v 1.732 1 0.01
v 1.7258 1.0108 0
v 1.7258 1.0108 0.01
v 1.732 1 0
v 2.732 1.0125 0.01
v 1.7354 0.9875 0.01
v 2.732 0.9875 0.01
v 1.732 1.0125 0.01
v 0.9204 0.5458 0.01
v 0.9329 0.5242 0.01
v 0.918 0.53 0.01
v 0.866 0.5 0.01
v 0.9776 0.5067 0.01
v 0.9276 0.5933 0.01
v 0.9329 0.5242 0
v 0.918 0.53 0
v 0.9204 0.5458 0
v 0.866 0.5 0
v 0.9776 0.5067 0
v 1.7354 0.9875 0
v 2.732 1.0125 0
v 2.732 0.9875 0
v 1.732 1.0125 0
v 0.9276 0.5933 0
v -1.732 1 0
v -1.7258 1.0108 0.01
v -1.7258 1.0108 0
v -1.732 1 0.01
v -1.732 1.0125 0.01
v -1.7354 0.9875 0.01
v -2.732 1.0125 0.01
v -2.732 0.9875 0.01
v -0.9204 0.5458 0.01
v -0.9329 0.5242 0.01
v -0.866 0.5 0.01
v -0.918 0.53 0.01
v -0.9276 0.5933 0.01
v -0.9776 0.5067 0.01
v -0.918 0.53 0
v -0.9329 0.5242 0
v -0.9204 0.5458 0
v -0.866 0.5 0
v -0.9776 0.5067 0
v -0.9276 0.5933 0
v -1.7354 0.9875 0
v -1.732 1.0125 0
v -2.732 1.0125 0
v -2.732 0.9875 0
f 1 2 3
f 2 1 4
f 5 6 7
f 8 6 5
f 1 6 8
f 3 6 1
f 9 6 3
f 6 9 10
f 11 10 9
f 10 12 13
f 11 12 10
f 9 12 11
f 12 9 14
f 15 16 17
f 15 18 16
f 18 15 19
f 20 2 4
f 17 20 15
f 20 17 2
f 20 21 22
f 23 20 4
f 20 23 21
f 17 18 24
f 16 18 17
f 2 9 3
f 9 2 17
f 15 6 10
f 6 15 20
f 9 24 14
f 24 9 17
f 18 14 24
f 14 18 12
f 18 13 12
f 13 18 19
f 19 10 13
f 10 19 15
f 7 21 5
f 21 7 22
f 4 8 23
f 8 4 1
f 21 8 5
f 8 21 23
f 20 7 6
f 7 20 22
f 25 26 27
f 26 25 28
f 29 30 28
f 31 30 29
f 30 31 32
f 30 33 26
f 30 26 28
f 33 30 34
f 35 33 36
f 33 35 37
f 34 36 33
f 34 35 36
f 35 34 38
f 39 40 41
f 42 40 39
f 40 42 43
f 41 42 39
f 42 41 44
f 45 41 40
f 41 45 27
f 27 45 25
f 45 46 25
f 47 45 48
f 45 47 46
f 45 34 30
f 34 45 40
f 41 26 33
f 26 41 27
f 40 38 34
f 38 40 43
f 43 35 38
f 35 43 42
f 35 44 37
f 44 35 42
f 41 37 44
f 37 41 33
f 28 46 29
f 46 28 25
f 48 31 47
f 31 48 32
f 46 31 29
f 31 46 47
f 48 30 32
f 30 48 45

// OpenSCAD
// file: ../drawing_sheet_sizes.scad
// drawing_sheet_sizes.scad
sheet_sizes = [
    // ISO 216 (A-Series)
    ["A0", [841, 1189]],
    ["A1", [594, 841]],
    ["A2", [420, 594]],
    ["A3", [297, 420]],
    ["A4", [210, 297]],

    // ANSI Standard (U.S.)
    ["ANSI_A", [216, 279]], // 8.5 × 11 inches
    ["ANSI_B", [279, 432]], // 11 × 17 inches
    ["ANSI_C", [432, 559]], // 17 × 22 inches
    ["ANSI_D", [559, 864]], // 22 × 34 inches
    ["ANSI_E", [864, 1118]], // 34 × 44 inches

    // Architectural Sizes (U.S.)
    ["ARCH_A", [229, 305]], // 9 × 12 inches
    ["ARCH_B", [305, 457]], // 12 × 18 inches
    ["ARCH_C", [457, 610]], // 18 × 24 inches
    ["ARCH_D", [610, 914]], // 24 × 36 inches
    ["ARCH_E", [914, 1219]], // 36 × 48 inches

    // ASME Y14.1 (Engineering Drawings)
    ["ENG_A", [216, 279]], // Same as ANSI A
    ["ENG_B", [279, 432]], // Same as ANSI B
    ["ENG_C", [432, 559]], // Same as ANSI C
    ["ENG_D", [559, 864]], // Same as ANSI D
    ["ENG_E", [864, 1118]], // Same as ANSI E

    // JIS B-Series (Japan)
    ["B0", [1030, 1456]],
    ["B1", [728, 1030]],
    ["B2", [515, 728]],
    ["B3", [364, 515]],
    ["B4", [257, 364]],
];
// file: ../src/dd_titleblock.scad
/**
 * @file dd_titleblock.scad
 * @brief Functions for creating title blocks on drawing sheets.
 * @details This file contains functions for creating title blocks on drawing sheets. The titleblock function creates a
 * title block with lines, descriptions, and details based on the given parameters.
 * @copyright (c) 2021 Don Smiley, (c) 2025 Cameron K. Brooks
 */

/*
 * titleblock(lines, descs, details, color, text_color)
 * Creates a title block for a drawing sheet, including lines, descriptions, and details.
 * Parameters:
 * - lines: Array defining the lines in the title block with format:
 *           [[startx, starty, orientation, length, width], ...]
 *           - orientation: Use DIM_HORZ or DIM_VERT for horizontal/vertical lines.
 *           - width: Factor to scale the line width beyond DIM_LINE_WIDTH.
 * - descs: Array defining descriptive text blocks with format:
 *           [[startx, starty, orientation, text, size], ...]
 *           - size: Factor to scale font size beyond DIM_FONTSCALE.
 * - details: Array defining part-specific details with format:
 *           [[startx, starty, orientation, text, size], ...]
 * - color: Line color.
 * - text_color: Text color.
 * Behavior:
 * - Draws lines and places text (descriptions and details) at specified positions.
 * - Handles horizontal and vertical orientations for text and lines.
 */
module titleblock(lines, descs, details, color = DEF_LINE_COLOR, text_color = DEF_TEXT_COLOR) {
    DIM_FONTSCALE = DIM_LINE_WIDTH * 0.7;

    for (line = lines)
    {
        color(color) translate([line[0] * DIM_LINE_WIDTH, line[1] * DIM_LINE_WIDTH, 0]) if (line[2] == DIM_VERT) {
                // a vertical line runs down from its start point, and line() draws upward
                translate([0, -line[3] * DIM_LINE_WIDTH, 0])
                    line(length=line[3] * DIM_LINE_WIDTH, width=DIM_LINE_WIDTH * line[4], vert=true);
            } else {
                line(length=(line[3] + 1) * DIM_LINE_WIDTH, width=DIM_LINE_WIDTH * line[4]);
            }
    }

    color(text_color) {
        for (line = descs)
        {
            translate([line[0] * DIM_LINE_WIDTH, line[1] * DIM_LINE_WIDTH, 0]) if (line[2] == DIM_VERT) {
                rotate([0, 0, 90])
                    scale([DIM_FONTSCALE * line[4], DIM_FONTSCALE * line[4], DIM_FONTSCALE * line[4]]) text(line[3]);
            } else {
                scale([DIM_FONTSCALE * line[4], DIM_FONTSCALE * line[4], DIM_FONTSCALE * line[4]]) text(line[3]);
            }
        }

        for (line = details)
        {
            translate([line[0] * DIM_LINE_WIDTH, line[1] * DIM_LINE_WIDTH, 0]) if (line[2] == DIM_VERT) {
                rotate([0, 0, 90])
                    scale([DIM_FONTSCALE * line[4], DIM_FONTSCALE * line[4], DIM_FONTSCALE * line[4]]) text(line[3]);
            } else {
                scale([DIM_FONTSCALE * line[4], DIM_FONTSCALE * line[4], DIM_FONTSCALE * line[4]]) text(line[3]);
            }
        }
    }
}
// file: ../src/dd_sheet.scad
/**
 * @file dd_sheet.scad
 * @brief Functions for drawing sheets from standard sizes and grid patterns.
 * @details This file contains functions for drawing sheets with standard sizes and grid patterns. The draw_sheet
 * function can draw a sheet boundary based on given dimensions or a standard sheet symbol with a grid or dot pattern.
 * @copyright (c) 2025 Cameron K. Brooks, (c) 2021 Don Smiley
 */

include <../drawing_sheet_sizes.scad>;

/*
 * draw_sheet(length, height, sheet_symbol, grid_type, line_width, color)
 * Draws a sheet boundary based on given dimensions or a standard sheet symbol and adds a grid or dot pattern if
 * specified. Parameters:
 * - length: Length of the sheet (overridden if sheet_symbol is provided).
 * - height: Height of the sheet (overridden if sheet_symbol is provided).
 * - sheet_symbol: Standard sheet size identifier (e.g., "A4", "ANSI_B").
 * - grid_type: "None", "Dot", or "Grid" to specify the background pattern.
 * - line_width: Thickness of the sheet boundary lines.
 * - color: Optional parameter to set the frame's color.
 */
module draw_sheet(
    length = undef,
    height = undef,
    sheet_symbol = undef,
    line_width = DIM_LINE_WIDTH * 2,
    line_height = DIM_LINE_HEIGHT,
    grid_type = "None",
    grid_dim = DIM_GRID_SPACING,
    grid_line_width = DIM_LINE_WIDTH,
    color = DEF_LINE_COLOR
) {
    // If a sheet symbol is provided, it overrides length and height using the sheet_sizes array.
    // An assignment inside an if block is local to that block, so the size is resolved here.
    matches = is_undef(sheet_symbol) ? [] : [for (sheet = sheet_sizes) if (sheet[0] == sheet_symbol) sheet[1]];
    sheet_length = len(matches) > 0 ? matches[0][0] : length;
    sheet_height = len(matches) > 0 ? matches[0][1] : height;

    if (!is_undef(sheet_symbol)) {
        echo("Looking for sheet symbol: ", sheet_symbol);

        if (len(matches) > 0) {
            echo("Match found for sheet symbol: ", sheet_symbol, " Dimensions: ", matches[0]);
        } else {
            echo("Warning: Sheet symbol '", sheet_symbol, "' not found.");
        }
    }

    // Proceed only if length and height are defined
    if (!is_undef(sheet_length) && !is_undef(sheet_height)) {
        // Draw the grid or dots before drawing the frame to ensure it's in the background
        draw_frame(sheet_length, sheet_height, line_width, line_height, color);
        translate([0, 0, -DIM_LINE_WIDTH])
            draw_grid(sheet_length, sheet_height, grid_type, grid_dim, grid_line_width, line_height, "lightgray");
    } else {
        echo("Warning: Invalid dimensions. Frame not drawn.");
    }
}

module draw_frame(length, height, line_width = DIM_LINE_WIDTH, line_height = DIM_LINE_HEIGHT, color = DEF_LINE_COLOR) {
    /*
     * draw_frame(length, height, line_width, color)
     * Draws the rectangular frame of a sheet with specified dimensions and line width.
     * Parameters:
     * - length: Length of the sheet frame.
     * - height: Height of the sheet frame.
     * - line_width: Thickness of the frame lines.
     * - color: Optional parameter to set the frame's color.
     * Behavior:
     * - Creates a rectangular frame with horizontal and vertical lines.
     */
    color(color) {
        // Bottom horizontal line
        line(length=length, width=line_width, height=line_height);

        // Top horizontal line
        translate([0, height, 0]) line(length=length, width=line_width, height=line_height);

        // Left vertical line
        translate([line_width / 2, line_width / 2, 0])
            line(length=height - line_width, width=line_width, height=line_height, vert=true);

        // Right vertical line
        translate([length - line_width / 2, line_width / 2, 0])
            line(length=height - line_width, width=line_width, height=line_height, vert=true);
    }
}

module draw_grid(
    length,
    height,
    type = "None",
    grid_spacing = DIM_GRID_SPACING,
    line_width = DIM_LINE_WIDTH / 2,
    line_height = DIM_LINE_HEIGHT,
    color = "lightgray"
) {
    /*
     * draw_grid(length, height, type, grid_spacing, line_width, color)
     * Adds a grid or dot pattern to the sheet.
     * Parameters:
     * - length: Length of the sheet.
     * - height: Height of the sheet.
     * - type: "None", "Dot", or "Grid" to specify the background pattern.
     * - grid_spacing: Distance between grid lines or dots.
     * - line_width: Thickness of grid lines (ignored for dots).
     * - color: Color of the grid lines or dots.
     */

    if (type == "Grid") {
        color(color) {
            // Draw vertical grid lines
            for (x = [0:grid_spacing:length])
            {
                translate([x, 0, 0]) line(length=height, width=line_width, height=line_height, vert=true);
            }

            // Draw horizontal grid lines
            for (y = [0:grid_spacing:height])
            {
                translate([0, y, 0]) line(
                        length=length, width=line_width, height=line_height,
                        left_arrow=false, right_arrow=false
                    );
            }
        }
    } else if (type == "Dot") {
        color(color) {
            // Define dot size
            dot_size = line_width; // You can adjust the dot size as needed

            for (x = [0:grid_spacing:length])
            {
                for (y = [0:grid_spacing:height])
                {
                    translate([x, y, 0]) sphere(r=dot_size, $fn=12);
                }
            }
        }
    } else {
        echo("No grid or dot pattern selected.");
    }
}
// file: ../dimdraft.scad
// ----- Variables -----
DOC_SCALING_FACTOR = is_undef(SCALING_FACTOR) ? 1 : SCALING_FACTOR;

// Line and text related constants

DIM_LINE_WIDTH_NOMINAL = 0.025; // Nominal line width
DIM_SPACE_NOMINAL = 0.1; // Nominal spacing value for line spacing adjustments
DIM_LINE_HEIGHT_NOMINAL = 0.01; // Nominal height of lines

DIM_LINE_WIDTH =
    is_undef(LINE_WIDTH) ? DIM_LINE_WIDTH_NOMINAL * DOC_SCALING_FACTOR : LINE_WIDTH; // Width of the dimension lines
DIM_LINE_HEIGHT =
    is_undef(HEIGHT) ? DIM_LINE_HEIGHT_NOMINAL * DOC_SCALING_FACTOR : HEIGHT; // Height of the dimension lines
DIM_SPACE =
    is_undef(SPACE) ? DIM_SPACE_NOMINAL * DOC_SCALING_FACTOR : SPACE; // Spacing value for line spacing adjustments

DEF_LINE_COLOR = is_undef(LINE_COLOR) ? "black" : LINE_COLOR; // Default line color
DEF_TEXT_COLOR = is_undef(TEXT_COLOR) ? "black" : TEXT_COLOR; // Default text color

// ----- Dependent Constants -----
// Hole center constant
DIM_HOLE_CENTER = DIM_LINE_WIDTH * 6; // Size of the cross within a circle
// Text is drawn at OpenSCAD's default size of 10 and scaled by DIM_FONTSCALE.
// Its height is 7 line widths unless TEXT_SIZE is set.
DIM_FONTSCALE = is_undef(TEXT_SIZE) ? DIM_LINE_WIDTH * 0.7 : TEXT_SIZE / 10;
DIM_TEXT_SIZE = DIM_FONTSCALE * 10; // Height of the text

DIM_GRID_SPACING = 50; // Default grid spacing value, standard for most drawings (i.e. ISO, ANSI, etc.)

// ----- Constants -----
// Dimension positioning constants
DIM_CENTER = 0;
DIM_LEFT = 1;
DIM_RIGHT = 2;
DIM_OUTSIDE = 3;

// Orientation constants
DIM_HORZ = 0;
DIM_VERT = 1;

// Corner positioning constants
DIM_UPPER_LEFT = 0;
DIM_UPPER_RIGHT = 1;
DIM_LOWER_LEFT = 2;
DIM_LOWER_RIGHT = 3;

// Offset value for hole length
ZFITE = 0.05; // Added to the hole length to extend past the surface of the cube

include <src/dd_dimlines.scad>;
include <src/dd_sheet.scad>;
include <src/dd_titleblock.scad>;
// main file
// A leader line without a label must evaluate with no warning and draw no text.
// reject: text\(
include <../dimdraft.scad>

leader_line(angle=30, radius=1, angle_length=1, horz_length=1);
leader_line(angle=150, radius=1, angle_length=1, horz_length=1, direction=DIM_LEFT);
